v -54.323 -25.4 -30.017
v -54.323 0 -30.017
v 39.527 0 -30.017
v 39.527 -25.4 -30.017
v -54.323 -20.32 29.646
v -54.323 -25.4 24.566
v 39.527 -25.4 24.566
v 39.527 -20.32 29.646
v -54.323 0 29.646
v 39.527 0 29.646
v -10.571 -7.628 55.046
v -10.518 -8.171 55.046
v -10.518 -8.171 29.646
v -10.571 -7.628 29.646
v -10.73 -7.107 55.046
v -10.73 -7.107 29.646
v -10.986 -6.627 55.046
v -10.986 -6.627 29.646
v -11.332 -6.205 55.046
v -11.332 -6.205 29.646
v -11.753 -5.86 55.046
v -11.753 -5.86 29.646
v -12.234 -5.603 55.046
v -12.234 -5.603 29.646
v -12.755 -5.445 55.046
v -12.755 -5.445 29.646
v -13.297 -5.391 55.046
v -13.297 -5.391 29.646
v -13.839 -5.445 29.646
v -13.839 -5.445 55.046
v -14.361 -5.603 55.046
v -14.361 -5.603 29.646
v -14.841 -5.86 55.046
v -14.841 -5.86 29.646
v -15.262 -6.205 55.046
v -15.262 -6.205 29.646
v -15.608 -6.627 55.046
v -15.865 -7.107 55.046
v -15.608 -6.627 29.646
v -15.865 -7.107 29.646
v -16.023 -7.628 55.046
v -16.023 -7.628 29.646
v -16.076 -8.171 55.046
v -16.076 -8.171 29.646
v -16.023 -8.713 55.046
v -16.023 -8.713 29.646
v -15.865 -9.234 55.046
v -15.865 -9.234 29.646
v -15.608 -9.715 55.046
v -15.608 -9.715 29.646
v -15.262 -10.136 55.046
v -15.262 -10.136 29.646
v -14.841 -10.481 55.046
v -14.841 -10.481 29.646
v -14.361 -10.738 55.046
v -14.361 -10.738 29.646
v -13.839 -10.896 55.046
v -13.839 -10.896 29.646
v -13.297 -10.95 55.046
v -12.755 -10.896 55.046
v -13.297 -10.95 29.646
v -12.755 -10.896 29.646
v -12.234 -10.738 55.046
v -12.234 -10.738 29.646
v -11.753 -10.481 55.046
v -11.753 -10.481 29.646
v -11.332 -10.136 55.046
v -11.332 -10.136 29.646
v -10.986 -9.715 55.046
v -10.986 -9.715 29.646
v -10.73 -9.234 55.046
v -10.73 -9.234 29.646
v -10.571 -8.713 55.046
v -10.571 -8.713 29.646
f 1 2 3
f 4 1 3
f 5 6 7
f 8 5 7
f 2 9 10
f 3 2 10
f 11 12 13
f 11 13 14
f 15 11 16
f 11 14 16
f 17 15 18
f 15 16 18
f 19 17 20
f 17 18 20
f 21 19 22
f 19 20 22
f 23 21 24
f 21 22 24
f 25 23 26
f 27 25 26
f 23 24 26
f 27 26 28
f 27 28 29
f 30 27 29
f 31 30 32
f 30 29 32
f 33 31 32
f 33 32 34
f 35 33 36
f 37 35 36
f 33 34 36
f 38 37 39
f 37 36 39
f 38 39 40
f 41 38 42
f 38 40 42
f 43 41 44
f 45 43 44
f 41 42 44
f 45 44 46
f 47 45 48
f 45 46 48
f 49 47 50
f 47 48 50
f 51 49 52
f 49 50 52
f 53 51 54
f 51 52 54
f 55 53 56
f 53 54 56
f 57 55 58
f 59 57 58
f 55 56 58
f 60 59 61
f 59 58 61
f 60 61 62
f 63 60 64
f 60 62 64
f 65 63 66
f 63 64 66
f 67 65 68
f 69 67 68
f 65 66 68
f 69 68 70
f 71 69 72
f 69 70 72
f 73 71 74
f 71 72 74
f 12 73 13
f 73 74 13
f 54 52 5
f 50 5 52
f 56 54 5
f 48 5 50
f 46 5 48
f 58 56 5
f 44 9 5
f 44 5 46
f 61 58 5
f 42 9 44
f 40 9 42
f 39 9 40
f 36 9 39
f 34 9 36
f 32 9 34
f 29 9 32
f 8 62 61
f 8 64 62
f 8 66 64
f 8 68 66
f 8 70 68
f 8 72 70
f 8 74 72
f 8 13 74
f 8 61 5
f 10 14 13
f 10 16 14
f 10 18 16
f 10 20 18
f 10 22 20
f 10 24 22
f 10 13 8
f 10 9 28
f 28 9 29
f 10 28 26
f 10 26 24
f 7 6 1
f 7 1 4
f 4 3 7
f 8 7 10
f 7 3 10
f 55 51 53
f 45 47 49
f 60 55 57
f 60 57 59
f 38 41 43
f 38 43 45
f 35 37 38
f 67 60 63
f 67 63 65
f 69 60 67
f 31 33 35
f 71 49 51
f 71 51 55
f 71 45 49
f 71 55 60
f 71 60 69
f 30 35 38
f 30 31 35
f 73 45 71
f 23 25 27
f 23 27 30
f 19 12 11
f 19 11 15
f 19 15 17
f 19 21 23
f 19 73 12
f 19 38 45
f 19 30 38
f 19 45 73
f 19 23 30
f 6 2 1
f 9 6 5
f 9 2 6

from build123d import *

# Parameters (mm, degrees)
F0_W     = 93.8496552408
F0_H     = 59.6632584929
F1_DEPTH = 25.4
F2_SIZE  = 5.08
F3_R     = 2.779114803
F4_DEPTH = 25.4


with BuildPart() as f1:
    # F0 (on Front) → F1 (new body)
    with BuildSketch(Plane.XZ):
        with Locations((-7.3980521411, -0.1858584583)):
            Rectangle(F0_W, F0_H)
    extrude(amount=F1_DEPTH)

    # F2
    f2_edges = [f1.edges().sort_by_distance(p)[0] for p in [
        (-7.398052, -25.4, 29.645771),
    ]]
    chamfer(f2_edges, length=F2_SIZE)

    # F3 (on face) → F4 (join)
    with BuildSketch(Plane.XY.offset(29.6457707882)):
        with Locations((-13.2972076535, -8.1705600023)):
            Circle(F3_R)
    extrude(amount=F4_DEPTH)


solid = f1.part
